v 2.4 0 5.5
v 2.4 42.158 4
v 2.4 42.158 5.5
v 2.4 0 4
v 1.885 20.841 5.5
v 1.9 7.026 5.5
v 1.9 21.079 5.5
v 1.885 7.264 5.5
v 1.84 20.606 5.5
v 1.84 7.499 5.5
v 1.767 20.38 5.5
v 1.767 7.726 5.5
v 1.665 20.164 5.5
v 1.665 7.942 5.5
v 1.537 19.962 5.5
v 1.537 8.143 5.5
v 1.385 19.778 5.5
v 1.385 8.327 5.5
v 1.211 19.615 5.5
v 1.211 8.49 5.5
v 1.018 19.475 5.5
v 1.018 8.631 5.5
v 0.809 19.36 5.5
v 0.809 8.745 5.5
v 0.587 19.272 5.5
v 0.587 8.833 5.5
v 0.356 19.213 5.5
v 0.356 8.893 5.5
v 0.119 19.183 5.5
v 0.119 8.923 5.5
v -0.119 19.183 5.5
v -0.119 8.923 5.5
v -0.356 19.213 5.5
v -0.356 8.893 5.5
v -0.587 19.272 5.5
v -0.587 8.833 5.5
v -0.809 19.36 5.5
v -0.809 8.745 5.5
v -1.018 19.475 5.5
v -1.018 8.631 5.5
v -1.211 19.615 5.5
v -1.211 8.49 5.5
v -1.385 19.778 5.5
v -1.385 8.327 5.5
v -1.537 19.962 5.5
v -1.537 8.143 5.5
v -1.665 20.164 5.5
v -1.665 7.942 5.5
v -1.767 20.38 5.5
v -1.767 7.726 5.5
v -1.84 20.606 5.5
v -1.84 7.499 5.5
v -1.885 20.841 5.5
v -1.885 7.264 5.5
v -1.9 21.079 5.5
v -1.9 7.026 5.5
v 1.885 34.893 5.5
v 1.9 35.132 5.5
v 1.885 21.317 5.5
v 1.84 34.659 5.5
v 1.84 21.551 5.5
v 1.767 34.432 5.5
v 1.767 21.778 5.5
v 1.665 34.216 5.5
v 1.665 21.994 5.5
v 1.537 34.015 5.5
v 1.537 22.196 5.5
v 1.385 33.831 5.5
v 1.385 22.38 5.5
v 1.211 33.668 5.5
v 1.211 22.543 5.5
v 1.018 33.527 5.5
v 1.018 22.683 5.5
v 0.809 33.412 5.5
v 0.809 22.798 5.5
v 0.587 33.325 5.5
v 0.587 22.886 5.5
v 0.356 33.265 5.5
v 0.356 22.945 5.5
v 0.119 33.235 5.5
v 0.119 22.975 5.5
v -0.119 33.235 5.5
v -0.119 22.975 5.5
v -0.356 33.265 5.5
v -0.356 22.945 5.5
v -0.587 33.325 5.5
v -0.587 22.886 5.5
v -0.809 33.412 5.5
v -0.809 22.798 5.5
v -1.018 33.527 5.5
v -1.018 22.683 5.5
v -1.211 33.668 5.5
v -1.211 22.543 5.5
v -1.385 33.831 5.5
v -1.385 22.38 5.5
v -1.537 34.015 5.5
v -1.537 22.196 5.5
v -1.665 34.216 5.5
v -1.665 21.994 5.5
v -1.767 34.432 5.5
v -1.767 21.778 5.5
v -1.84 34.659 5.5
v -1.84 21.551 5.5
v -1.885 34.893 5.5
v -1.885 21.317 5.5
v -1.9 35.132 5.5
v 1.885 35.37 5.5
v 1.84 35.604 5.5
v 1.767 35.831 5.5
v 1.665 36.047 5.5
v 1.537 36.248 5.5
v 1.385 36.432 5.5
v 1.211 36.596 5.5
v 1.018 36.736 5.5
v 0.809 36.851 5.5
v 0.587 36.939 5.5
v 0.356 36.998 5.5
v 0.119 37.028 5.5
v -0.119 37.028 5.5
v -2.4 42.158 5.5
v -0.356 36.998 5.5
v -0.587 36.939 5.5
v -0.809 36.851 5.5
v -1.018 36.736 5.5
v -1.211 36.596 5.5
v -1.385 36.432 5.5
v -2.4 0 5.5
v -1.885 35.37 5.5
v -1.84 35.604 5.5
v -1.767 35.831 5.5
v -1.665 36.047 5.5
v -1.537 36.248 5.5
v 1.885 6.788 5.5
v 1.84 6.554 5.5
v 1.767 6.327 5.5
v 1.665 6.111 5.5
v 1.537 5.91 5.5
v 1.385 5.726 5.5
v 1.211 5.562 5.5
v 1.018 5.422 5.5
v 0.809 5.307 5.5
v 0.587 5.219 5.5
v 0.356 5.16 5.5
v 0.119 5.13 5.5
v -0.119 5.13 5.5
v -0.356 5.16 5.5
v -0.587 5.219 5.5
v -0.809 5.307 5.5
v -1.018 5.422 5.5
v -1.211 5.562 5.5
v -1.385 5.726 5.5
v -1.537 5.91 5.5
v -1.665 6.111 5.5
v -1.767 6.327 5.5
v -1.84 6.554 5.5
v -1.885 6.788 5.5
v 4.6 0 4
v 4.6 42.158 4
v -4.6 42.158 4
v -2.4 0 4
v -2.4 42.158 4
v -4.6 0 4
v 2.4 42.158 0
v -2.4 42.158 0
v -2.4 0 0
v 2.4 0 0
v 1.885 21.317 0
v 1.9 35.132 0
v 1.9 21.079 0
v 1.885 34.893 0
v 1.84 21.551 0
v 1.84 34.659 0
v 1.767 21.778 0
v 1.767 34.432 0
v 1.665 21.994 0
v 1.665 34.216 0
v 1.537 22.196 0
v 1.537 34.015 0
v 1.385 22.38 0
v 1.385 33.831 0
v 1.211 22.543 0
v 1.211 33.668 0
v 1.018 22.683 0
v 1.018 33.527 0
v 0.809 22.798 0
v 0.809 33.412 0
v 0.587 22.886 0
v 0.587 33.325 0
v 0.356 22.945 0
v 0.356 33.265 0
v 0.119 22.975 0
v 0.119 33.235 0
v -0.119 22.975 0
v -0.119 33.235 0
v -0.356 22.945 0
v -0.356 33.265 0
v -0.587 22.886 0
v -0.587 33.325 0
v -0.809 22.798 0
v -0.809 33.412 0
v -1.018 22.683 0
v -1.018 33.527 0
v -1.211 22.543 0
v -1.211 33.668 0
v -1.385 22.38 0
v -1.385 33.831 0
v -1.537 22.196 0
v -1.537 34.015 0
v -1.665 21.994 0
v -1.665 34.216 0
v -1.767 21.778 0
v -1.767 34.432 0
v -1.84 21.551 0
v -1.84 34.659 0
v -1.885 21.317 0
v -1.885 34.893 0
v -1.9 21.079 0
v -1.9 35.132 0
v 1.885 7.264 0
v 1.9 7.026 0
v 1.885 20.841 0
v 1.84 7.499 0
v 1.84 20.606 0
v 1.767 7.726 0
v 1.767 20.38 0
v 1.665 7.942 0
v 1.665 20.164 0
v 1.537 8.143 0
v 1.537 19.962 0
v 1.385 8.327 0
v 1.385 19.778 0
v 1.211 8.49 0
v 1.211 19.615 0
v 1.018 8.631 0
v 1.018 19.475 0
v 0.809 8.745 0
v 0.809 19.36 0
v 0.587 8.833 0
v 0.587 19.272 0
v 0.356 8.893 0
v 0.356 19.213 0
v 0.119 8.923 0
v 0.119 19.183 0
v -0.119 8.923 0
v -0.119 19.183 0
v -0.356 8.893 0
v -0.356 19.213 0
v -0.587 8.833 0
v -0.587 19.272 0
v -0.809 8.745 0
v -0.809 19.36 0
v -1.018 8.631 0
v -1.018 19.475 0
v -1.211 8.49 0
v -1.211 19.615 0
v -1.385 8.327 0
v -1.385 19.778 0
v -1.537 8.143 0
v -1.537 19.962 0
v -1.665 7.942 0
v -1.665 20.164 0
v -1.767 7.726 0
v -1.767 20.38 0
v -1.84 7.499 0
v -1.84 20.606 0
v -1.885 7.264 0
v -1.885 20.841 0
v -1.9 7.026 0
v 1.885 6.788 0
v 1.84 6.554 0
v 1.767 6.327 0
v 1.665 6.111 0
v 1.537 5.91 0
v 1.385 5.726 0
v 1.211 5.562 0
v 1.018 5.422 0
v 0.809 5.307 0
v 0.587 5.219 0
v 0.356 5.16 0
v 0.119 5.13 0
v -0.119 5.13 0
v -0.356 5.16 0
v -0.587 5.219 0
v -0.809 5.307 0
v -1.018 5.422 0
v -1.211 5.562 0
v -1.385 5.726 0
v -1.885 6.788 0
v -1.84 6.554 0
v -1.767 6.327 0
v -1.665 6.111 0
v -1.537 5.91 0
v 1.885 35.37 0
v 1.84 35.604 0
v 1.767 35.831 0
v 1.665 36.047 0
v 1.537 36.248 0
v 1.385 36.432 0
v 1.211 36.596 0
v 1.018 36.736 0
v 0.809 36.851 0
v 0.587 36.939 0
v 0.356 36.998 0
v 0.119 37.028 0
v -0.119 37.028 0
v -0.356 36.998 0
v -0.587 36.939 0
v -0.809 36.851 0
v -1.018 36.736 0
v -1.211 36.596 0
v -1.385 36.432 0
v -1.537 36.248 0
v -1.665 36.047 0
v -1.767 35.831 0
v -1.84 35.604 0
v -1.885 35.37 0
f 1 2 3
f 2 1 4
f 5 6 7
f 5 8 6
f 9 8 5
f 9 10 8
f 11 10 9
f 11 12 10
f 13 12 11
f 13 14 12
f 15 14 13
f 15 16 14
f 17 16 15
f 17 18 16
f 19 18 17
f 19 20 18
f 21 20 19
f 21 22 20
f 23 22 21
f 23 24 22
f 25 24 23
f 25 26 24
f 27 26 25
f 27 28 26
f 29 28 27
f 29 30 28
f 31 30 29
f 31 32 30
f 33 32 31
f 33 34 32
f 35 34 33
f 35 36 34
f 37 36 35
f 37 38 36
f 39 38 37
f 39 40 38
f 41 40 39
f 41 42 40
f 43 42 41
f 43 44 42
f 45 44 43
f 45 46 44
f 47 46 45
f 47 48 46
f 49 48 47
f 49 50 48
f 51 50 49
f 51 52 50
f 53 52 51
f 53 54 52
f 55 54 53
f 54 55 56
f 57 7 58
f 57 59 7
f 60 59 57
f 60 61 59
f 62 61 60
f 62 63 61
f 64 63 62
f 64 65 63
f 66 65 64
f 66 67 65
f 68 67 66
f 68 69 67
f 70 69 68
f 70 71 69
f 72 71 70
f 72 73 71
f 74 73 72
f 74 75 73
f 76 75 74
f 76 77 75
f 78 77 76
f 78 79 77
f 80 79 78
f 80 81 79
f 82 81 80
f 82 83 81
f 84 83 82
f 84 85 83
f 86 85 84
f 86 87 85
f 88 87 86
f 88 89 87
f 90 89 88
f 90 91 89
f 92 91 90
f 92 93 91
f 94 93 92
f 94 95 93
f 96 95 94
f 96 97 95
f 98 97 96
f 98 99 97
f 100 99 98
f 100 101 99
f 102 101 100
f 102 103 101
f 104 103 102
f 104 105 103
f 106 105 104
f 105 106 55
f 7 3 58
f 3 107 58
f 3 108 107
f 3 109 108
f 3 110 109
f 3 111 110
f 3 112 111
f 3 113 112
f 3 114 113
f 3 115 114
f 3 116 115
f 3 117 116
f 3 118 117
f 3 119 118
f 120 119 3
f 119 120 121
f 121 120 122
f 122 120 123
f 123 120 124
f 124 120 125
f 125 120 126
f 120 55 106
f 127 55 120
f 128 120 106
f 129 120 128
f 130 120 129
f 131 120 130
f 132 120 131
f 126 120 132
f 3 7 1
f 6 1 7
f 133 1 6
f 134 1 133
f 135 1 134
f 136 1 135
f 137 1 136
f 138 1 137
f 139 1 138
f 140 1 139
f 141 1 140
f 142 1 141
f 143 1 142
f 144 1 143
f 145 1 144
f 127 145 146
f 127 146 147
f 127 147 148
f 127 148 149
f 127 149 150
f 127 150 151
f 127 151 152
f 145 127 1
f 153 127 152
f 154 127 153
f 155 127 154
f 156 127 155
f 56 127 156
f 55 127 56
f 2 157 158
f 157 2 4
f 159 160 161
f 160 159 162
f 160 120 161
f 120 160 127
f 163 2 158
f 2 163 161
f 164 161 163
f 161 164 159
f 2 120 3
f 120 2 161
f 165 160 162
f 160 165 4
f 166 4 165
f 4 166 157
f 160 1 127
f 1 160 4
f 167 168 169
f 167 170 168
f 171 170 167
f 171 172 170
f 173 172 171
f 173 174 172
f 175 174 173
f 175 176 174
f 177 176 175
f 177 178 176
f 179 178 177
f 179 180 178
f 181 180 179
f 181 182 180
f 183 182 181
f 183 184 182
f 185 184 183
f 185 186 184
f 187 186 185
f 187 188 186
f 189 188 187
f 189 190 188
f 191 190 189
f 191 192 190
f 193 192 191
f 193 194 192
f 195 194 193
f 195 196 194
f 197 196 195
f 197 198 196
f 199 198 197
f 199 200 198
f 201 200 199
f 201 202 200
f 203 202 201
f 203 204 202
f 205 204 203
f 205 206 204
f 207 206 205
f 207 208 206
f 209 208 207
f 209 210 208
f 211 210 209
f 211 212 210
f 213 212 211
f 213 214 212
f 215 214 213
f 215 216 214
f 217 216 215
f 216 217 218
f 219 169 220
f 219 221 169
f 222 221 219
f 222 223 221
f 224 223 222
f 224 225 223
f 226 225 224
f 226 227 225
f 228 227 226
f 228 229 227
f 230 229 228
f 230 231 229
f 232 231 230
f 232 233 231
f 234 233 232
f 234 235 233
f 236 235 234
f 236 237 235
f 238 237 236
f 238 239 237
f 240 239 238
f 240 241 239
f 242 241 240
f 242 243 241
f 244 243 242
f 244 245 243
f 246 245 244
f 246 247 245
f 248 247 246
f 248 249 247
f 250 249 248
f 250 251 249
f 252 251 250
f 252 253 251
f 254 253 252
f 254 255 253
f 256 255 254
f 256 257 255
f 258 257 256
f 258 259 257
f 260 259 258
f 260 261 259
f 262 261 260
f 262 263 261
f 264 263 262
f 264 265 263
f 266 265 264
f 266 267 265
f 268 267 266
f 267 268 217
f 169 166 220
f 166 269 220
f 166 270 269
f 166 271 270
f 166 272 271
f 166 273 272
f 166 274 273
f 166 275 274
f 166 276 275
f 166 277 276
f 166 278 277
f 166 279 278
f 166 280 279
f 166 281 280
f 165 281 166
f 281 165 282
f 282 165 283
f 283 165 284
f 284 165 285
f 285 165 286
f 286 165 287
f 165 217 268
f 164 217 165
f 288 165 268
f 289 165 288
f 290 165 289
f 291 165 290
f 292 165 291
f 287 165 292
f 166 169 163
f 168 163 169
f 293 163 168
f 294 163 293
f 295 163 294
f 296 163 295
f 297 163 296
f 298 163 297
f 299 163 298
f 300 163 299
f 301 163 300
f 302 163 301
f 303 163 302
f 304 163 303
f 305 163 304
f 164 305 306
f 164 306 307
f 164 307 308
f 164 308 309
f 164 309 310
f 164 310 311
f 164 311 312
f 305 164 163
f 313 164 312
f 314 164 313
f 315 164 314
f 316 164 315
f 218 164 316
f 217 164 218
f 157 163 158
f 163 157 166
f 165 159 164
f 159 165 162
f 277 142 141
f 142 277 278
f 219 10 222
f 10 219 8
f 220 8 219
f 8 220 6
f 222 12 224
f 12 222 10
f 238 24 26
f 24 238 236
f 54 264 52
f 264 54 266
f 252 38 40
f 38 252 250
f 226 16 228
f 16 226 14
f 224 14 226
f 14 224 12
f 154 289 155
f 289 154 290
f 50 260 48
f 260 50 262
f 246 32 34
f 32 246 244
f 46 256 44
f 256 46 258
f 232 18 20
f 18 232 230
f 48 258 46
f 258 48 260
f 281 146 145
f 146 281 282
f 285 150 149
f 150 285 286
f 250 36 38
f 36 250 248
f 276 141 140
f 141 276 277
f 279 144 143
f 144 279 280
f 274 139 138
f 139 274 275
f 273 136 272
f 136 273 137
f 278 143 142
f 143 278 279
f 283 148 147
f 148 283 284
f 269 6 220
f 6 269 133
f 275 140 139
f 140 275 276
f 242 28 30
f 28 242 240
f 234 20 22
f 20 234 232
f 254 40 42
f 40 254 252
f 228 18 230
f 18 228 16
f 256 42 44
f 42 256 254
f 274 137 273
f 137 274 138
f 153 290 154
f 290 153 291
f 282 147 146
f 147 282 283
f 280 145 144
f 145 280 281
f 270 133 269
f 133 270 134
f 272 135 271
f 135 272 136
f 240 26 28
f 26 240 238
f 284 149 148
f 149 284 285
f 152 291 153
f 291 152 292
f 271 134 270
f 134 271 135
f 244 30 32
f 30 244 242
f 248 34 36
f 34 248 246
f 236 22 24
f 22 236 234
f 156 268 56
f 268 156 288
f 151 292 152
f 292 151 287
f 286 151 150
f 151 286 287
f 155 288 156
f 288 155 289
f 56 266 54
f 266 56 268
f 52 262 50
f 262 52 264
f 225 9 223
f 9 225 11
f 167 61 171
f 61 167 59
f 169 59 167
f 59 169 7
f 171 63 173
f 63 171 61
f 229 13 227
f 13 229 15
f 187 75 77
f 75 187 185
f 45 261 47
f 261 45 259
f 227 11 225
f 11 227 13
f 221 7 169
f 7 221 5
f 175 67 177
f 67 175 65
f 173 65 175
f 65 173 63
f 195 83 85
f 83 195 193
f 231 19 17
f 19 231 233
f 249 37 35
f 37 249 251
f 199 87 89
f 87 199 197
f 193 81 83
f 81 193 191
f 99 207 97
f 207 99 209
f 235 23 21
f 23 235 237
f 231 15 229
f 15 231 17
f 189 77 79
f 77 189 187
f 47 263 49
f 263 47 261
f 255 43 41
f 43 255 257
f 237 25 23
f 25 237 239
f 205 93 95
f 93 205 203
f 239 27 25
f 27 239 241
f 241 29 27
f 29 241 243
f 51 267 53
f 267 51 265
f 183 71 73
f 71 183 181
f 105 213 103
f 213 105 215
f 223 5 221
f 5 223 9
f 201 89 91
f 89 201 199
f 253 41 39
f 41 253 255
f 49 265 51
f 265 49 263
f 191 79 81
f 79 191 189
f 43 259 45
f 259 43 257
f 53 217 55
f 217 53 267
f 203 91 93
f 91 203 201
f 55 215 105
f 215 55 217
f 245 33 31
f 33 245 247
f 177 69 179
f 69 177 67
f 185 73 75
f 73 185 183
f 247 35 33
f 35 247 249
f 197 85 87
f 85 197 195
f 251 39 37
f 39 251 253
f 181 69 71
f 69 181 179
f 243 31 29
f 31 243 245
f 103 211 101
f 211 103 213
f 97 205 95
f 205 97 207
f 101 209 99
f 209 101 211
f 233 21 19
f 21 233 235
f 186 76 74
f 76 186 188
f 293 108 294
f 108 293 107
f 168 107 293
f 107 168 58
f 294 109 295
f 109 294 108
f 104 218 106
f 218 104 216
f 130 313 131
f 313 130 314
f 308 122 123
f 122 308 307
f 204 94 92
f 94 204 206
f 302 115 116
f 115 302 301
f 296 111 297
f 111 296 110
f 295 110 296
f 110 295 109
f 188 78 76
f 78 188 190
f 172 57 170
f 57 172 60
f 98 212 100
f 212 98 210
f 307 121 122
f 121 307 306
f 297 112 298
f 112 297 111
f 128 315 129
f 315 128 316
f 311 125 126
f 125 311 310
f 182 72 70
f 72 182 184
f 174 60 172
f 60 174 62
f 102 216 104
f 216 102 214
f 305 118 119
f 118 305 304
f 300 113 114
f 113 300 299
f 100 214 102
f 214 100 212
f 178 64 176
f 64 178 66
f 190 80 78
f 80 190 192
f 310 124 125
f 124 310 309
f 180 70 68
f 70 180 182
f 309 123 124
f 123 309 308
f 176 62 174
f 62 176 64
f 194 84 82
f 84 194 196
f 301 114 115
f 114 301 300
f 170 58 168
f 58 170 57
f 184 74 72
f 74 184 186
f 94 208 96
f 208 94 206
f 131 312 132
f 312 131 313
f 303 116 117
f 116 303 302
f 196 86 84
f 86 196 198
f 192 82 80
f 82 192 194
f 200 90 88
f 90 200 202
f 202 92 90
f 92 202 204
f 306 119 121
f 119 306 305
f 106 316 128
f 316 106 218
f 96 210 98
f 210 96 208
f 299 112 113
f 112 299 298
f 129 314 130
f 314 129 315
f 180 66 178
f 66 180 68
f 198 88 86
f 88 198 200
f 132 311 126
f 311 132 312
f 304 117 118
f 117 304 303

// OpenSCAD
// file: parts.scad
module chimney() {    
    for(i=[0:8:80]){
        echo(i);
        translate([20 + (width-80)/2  +i,-1,20]){
            minkowski(){
                cube([0.01,50,30]);    
                sphere(d=2,h=1);        
            }
        }
    }
}


module handlescrew(){
    translate([0,0,-39]){cylinder(d=5,h=40); }
    translate([0,0,-4]){cylinder(d1=10,d2=6,h=3.5);}
    translate([0,0,-34]){cylinder(d=10,h=30);}
}

module wedge(){
    translate([sixinch/2,-10,15]){
        rotate([0,45+45/2,0]){
            cube([80,80,30]);
        }
        translate([0,80,0]){
            rotate([0,45+45/2,180]){
                cube([80,80,30]);
            }
        }
        translate([-20,0,-100]){
            cube([40,80,100]);
        }
    }
}

module screw(){
    cylinder(r1=screw_head/2, r2=screw_dia/2, h=screw_head_height);
    cylinder(r=screw_dia/2, h=40);    
    translate([0,0,-0.99]){cylinder(r=screw_head/2, h=1);}    
}



module insideprofile(l){
    difference(){
        union(){
            translate([7.6,10,0]){cube([4.8,10,l]);}
            translate([0,7.6,0]){cube([20,4.8,l]);}  
            
            translate([6.5,10-2.1,0]){cube([7   ,10,l]);}
            translate([2.1,6.5,0]){cube([15.8,7   ,l]);}  
        }
        translate([4,4,-1]){
            cube([12,12,l+2]);
        }
    } 
    translate([20,20,0]){
        rotate([0,-90,0]){
            linear_extrude(20){
                polygon (points=[[0,0],[l,0],[0,l]]);
            }
        }
    }    
}

module extrusion(u,center,front,side){
    len=unit*u;
    difference(){
        translate([0,2,2]){
            minkowski(){
                cube([len,16,16]);
                sphere(d=4);
            }
        } 
        translate([-5,10,1.99]){
            rotate([0,90,0]){linear_extrude(len+10){polygon(points=[[0,-2.5],[2,-4],[2,4],[0,2.5]]);}}
        }
        translate([-5,10,18.01]){
            rotate([0,-90,180]){linear_extrude(len+10){polygon(points=[[0,-2.5],[2,-4],[2,4],[0,2.5]]);}}
        }    
        translate([-5,18.01,10]){
            rotate([90,0,90]){linear_extrude(len+10){polygon(points=[[0,-2.5],[2,-4],[2,4],[0,2.5]]);}}
        }    
        translate([-5,1.99,10]){
            rotate([-90,0,-90]){linear_extrude(len+10){polygon(points=[[0,-2.5],[2,-4],[2,4],[0,2.5]]);}}
        }    
        if(center){
            translate([-5,10,10]){
                rotate([0,90,0]){
                    cylinder(d=4.6,h=len+10);
                }
            }
        }     
        //holes
        if(front){
            for(i=[0:30]){
                translate([unit/2+i*unit,10,-5]){ cylinder(d=3.8,h=30);}
            }
        }    
        if(side){
            for(i=[0:30]){
                translate([unit/2+i*unit,25,10]){ rotate([90,0,0]){cylinder(d=3.8,h=30);}}
            }
        }
        //length cutoff
        translate([-2,0,0]){cube([4,60,60],center=true);}
        translate([len+2,0,0]){cube([4,60,60],center=true);}    
    }
}

module baseplate(u){
    difference(){
        union(){
            translate([1.25,1.25,1.25]){
                minkowski(){
                    cube([sixinch-2.5,unit*u-2.5,gauge-2.5]);
                    sphere(r=1.25);
                }
            }
        }
        //Rack mount holes
        translate([10-0.5,unit/2,-gauge/2])                 {cylinder(r=2.3,gauge*2);}
        translate([sixinch-10+0.5,unit/2,-gauge/2])         {cylinder(r=2.3,gauge*2);}
        translate([10-0.5,u*unit-(unit/2),-gauge/2])        {cylinder(r=2.3,gauge*2);}
        translate([sixinch-10+0.5,u*unit-(unit/2),-gauge/2]){cylinder(r=2.3,gauge*2);}
        if(u>=5){
            translate([10-0.5,(u*unit)/2,-gauge/2])         {cylinder(r=2.3,gauge*2);}
            translate([sixinch-10+0.5,(u*unit)/2,-gauge/2]) {cylinder(r=2.3,gauge*2);}
        }  
    }    
}
// file: config.scad
// This file contains all the parts for a rack enclosure
// It has the format required for a customizable project on Thingiverse
// Note: Calculated variables does not show up in the customizer, hence the *1; 

$fn = 50*1;

part = "f"; // [a:Extrusion no holes,b:Extrusion front holes,c:Extrusion front and side holes,d:End open,e:End grid,f:End chimney,g:End closed,h:Nut-less Trap,i:Panel,j:Panel with handle,k:Handle]


//Hole size for 4mm screws or freedom unit equivalent
Four_mm_screw = 3.8;

//Hole size for 5mm screws or freedom unit equivalent
Five_mm_screw = 4.8;

//Constants, do not change !
sixinch   = 155*1;       // cm = 6"  
width     = 155-20-20;   // 11.5cm between rails
unit      = (44.5/19)*6; // 1U = 14.05cm
gauge     = 3*1;
gauge_box = 2*1;
slip      = 0.35*1;      // extra slip between parts
Units=3;

include <parts.scad>;
// main file
include <config.scad>;
// Nut-less Trap
module trap(u){
    difference(){
        union(){
            translate([-2.4,0,4]){
                cube([4.8,unit*u,1.5]);
            }    
            translate([-2.4,unit*u,0]){
                rotate([90,0,0]){
                    linear_extrude(unit*u){
                        polygon(points=[[0,0],[4.8,0],[7,4],[-2.2,4]]);
                    }
                }
            }
        }                        
        for(i=[1:u]){
            translate([0,unit*i-unit/2,-1]){
                cylinder(d=Four_mm_screw,h=10);
            }                       
        }
    }
}

trap(Units);
